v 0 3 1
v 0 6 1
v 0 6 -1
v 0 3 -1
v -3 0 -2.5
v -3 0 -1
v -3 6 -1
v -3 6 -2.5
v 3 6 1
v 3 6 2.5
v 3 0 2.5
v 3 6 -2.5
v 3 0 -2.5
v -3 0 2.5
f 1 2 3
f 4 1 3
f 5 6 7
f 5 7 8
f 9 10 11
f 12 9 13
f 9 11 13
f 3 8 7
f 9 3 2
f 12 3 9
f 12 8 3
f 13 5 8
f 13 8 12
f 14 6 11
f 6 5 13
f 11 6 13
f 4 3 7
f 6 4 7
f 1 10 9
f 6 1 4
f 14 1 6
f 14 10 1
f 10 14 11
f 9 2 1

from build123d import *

# Parameters (mm, degrees)
SKETCH1_W           = 6
SKETCH1_H           = 5
BOSS_EXTRUDE1_DEPTH = 6
CUT_EXTRUDE1_DEPTH  = 3.5
SKETCH3_W           = 3
SKETCH3_H           = 2
BOSS_EXTRUDE2_DEPTH = 3


with BuildPart() as part:
    # Sketch1 → Boss-Extrude1 (new body)
    with BuildSketch(Plane(origin=(0, 0, 0), x_dir=(1, 0, 0), z_dir=(0, 1, 0))):
        Rectangle(SKETCH1_W, SKETCH1_H)
    extrude(amount=BOSS_EXTRUDE1_DEPTH)

    # Sketch2 → Cut-Extrude1 (cut)
    with BuildSketch(Plane.XY.offset(2.5)):
        Polygon((3, 6), (-3, 0), (-3, 6), align=None)
    extrude(amount=-CUT_EXTRUDE1_DEPTH, mode=Mode.SUBTRACT)

    # Sketch3 → Boss-Extrude2 (add)
    with BuildSketch(Plane(origin=(0, 6, 0), x_dir=(1, 0, 0), z_dir=(0, 1, 0))):
        with Locations((1.5, 0)):
            Rectangle(SKETCH3_W, SKETCH3_H)
    extrude(amount=-BOSS_EXTRUDE2_DEPTH)


solid = part.part
